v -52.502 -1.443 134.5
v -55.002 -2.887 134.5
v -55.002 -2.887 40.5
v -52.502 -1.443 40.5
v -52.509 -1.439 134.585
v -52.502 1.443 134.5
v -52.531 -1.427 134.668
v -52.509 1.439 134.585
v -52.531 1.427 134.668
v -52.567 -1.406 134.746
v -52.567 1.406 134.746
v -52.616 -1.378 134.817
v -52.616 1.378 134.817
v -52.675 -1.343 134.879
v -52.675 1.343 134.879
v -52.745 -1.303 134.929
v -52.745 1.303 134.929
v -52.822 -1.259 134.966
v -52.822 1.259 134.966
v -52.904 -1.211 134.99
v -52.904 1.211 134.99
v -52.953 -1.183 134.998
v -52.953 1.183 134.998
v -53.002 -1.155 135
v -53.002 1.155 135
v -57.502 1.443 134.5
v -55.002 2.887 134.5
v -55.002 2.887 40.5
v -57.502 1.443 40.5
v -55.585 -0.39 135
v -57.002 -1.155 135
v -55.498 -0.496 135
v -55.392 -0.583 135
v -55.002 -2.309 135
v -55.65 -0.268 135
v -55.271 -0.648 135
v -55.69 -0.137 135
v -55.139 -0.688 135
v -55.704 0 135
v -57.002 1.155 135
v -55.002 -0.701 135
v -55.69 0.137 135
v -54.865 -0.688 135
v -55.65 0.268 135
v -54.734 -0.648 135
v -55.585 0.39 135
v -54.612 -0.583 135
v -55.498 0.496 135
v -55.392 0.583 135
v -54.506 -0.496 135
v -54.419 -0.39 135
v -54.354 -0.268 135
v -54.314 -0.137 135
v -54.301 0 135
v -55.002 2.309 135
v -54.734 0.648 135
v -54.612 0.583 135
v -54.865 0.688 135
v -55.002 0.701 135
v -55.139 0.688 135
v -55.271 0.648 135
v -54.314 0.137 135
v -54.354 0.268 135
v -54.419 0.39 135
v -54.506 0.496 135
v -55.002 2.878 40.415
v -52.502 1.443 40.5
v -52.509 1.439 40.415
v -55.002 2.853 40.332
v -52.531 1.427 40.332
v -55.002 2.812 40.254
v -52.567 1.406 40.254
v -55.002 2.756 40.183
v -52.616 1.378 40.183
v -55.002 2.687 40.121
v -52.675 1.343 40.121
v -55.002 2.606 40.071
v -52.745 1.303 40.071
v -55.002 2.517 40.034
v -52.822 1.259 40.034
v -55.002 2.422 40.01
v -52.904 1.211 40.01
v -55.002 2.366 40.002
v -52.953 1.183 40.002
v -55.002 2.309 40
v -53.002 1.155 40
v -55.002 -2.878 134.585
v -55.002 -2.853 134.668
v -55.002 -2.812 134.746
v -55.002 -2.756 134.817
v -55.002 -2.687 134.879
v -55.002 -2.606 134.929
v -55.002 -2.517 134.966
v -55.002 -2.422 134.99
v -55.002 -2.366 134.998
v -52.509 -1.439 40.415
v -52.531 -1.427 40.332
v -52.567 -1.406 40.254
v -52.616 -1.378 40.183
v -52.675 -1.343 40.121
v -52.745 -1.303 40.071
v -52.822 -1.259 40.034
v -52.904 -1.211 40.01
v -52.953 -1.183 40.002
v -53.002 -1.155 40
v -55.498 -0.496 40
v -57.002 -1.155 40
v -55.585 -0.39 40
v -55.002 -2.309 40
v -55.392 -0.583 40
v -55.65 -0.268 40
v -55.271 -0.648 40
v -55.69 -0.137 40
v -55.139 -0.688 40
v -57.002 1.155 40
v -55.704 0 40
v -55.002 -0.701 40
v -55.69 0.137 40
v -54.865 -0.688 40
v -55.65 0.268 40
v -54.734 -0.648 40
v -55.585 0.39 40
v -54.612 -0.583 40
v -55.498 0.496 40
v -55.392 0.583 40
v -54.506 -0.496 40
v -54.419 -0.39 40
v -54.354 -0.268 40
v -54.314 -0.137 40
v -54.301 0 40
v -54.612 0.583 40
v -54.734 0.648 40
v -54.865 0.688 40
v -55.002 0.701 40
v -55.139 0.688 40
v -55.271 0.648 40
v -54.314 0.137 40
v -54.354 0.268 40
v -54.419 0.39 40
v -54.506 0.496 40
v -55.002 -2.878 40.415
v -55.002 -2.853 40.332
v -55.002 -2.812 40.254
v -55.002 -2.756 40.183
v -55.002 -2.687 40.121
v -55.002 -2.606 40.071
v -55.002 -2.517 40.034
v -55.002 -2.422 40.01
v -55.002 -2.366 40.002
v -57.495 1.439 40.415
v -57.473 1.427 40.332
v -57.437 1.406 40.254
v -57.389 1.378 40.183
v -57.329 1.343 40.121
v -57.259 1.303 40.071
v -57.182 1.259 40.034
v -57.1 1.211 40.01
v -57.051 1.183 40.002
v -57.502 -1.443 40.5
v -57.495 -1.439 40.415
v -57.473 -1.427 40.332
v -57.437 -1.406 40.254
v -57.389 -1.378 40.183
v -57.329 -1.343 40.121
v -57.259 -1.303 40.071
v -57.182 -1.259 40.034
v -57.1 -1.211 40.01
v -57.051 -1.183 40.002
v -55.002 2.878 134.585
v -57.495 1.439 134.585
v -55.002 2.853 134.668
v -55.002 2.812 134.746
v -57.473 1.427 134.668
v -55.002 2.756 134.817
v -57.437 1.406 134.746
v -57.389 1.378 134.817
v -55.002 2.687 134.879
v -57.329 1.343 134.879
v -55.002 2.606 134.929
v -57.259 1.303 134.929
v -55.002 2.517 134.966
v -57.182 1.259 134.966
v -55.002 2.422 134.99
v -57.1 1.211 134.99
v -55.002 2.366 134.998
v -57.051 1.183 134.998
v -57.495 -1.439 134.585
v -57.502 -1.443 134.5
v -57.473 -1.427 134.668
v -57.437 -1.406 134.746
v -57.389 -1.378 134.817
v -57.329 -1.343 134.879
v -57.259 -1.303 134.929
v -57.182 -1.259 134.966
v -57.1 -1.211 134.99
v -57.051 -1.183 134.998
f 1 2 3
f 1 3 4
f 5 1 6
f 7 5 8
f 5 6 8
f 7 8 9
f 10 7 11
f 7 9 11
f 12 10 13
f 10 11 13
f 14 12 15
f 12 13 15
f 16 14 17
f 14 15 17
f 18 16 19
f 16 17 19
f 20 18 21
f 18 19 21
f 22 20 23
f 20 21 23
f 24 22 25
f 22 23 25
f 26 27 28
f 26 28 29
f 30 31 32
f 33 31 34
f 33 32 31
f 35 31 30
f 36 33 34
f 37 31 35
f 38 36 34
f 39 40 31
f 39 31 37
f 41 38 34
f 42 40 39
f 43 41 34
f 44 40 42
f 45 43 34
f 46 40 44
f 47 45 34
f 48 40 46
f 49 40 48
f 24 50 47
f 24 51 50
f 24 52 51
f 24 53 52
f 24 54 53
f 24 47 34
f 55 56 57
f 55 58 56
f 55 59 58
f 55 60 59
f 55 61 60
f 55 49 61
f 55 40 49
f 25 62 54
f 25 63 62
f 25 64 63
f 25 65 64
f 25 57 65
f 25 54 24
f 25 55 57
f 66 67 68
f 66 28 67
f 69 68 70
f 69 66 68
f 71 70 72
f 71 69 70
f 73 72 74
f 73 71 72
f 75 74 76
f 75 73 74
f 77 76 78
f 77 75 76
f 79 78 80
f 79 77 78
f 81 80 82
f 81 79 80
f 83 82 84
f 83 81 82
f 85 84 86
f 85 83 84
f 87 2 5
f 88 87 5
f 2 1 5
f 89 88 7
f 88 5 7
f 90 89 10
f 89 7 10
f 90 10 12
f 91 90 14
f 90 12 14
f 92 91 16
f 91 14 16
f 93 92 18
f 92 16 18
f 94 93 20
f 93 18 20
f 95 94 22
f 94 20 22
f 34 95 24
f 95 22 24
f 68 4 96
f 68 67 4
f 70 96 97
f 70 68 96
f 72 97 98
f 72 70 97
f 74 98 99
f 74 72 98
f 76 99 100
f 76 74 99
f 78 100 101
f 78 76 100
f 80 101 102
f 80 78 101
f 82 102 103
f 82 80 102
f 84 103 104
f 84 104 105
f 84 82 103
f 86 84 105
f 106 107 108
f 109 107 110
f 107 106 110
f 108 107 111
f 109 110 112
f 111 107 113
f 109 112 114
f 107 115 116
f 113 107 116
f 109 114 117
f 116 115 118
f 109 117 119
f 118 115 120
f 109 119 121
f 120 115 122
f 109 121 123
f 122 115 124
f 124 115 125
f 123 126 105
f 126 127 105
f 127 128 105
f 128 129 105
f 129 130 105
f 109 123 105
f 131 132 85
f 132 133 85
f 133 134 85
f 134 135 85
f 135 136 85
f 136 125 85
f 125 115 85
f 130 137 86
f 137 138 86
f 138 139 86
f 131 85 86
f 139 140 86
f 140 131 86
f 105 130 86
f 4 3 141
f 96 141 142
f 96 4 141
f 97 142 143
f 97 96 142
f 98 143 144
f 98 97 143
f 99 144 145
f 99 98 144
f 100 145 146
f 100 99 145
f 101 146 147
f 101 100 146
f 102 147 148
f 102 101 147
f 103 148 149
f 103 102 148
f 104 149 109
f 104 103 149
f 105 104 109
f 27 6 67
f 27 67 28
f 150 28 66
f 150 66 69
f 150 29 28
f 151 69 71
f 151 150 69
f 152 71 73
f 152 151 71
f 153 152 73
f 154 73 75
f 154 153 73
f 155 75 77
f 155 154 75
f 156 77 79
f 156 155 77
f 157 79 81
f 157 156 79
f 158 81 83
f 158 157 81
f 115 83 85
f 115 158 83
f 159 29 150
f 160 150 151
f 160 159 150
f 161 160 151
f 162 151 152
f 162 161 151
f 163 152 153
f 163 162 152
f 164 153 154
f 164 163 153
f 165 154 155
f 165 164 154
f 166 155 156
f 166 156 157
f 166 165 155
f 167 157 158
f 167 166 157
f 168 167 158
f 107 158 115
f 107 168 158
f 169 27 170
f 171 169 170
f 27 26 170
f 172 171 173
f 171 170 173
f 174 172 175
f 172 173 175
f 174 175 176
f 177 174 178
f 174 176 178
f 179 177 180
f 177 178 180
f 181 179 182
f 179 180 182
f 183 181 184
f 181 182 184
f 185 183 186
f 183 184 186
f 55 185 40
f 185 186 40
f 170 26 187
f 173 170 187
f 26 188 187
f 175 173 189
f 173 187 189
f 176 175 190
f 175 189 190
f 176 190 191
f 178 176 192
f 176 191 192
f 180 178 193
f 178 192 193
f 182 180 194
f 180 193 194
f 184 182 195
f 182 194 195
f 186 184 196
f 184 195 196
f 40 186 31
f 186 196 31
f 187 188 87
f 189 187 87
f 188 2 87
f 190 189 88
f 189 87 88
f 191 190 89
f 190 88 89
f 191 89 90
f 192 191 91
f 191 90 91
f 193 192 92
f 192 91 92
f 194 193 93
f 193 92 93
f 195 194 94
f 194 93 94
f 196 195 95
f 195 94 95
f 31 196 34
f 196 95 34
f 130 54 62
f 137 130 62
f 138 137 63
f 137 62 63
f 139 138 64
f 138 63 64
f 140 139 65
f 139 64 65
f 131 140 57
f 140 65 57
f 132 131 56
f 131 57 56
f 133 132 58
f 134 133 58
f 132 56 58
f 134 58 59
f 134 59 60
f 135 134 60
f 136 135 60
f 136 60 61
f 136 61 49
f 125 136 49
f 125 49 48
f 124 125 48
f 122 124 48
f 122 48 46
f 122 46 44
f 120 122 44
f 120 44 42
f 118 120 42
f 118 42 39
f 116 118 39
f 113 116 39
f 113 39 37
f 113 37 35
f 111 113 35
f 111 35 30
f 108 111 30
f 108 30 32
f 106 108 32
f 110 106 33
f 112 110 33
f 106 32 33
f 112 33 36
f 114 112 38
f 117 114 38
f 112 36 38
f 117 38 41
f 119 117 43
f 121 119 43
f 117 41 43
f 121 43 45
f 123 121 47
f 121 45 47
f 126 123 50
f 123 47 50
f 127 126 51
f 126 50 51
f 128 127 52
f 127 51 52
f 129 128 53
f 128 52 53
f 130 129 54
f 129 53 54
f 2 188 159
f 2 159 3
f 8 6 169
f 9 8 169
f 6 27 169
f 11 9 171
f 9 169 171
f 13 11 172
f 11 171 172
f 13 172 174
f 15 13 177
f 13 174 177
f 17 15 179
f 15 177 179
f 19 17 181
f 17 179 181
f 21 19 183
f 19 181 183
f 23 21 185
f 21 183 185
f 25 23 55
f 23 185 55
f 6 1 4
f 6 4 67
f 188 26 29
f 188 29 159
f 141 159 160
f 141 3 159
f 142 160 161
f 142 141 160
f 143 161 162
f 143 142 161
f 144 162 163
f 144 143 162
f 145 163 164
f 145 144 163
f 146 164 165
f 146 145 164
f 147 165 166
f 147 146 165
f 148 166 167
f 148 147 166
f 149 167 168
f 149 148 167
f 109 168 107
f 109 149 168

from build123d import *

# Parameters (mm, degrees)
RESSALTO_EXTRUS_O1_DEPTH = 95
FILETE1_R                = 0.5
ESBO_O2_R                = 0.701481341
CORTE_EXTRUS_O1_DEPTH    = 112.084775939


with BuildPart() as part:
    # Esboço1 → Ressalto-extrusão1 (new body)
    with BuildSketch(Plane.XY.offset(135)):
        Polygon((-55.002122675, 2.886751346), (-57.502122675, 1.443375673), (-57.502122675, -1.443375673), (-55.002122675, -2.886751346), (-52.502122675, -1.443375673), (-52.502122675, 1.443375673), align=None)
    extrude(amount=-RESSALTO_EXTRUS_O1_DEPTH)

    # Filete1
    filete1_edges = [part.edges().sort_by_distance(p)[0] for p in [
        (-57.502122675, 0, 40),
        (-56.252122675, -2.165063509, 40),
        (-53.752122675, -2.165063509, 40),
        (-52.502122675, 0, 40),
        (-53.752122675, 2.165063509, 40),
        (-52.502122675, 0, 135),
        (-53.752122675, -2.165063509, 135),
        (-56.252122675, -2.165063509, 135),
        (-57.502122675, 0, 135),
        (-56.252122675, 2.165063509, 135),
        (-53.752122675, 2.165063509, 135),
        (-56.252122675, 2.165063509, 40),
    ]]
    fillet(filete1_edges, radius=FILETE1_R)

    # Esboço2 → Corte-extrusão1 (cut, through all)
    with BuildSketch(Plane.XY.offset(135)):
        with Locations((-55.002122675, 0)):
            Circle(ESBO_O2_R)
    extrude(amount=-CORTE_EXTRUS_O1_DEPTH, mode=Mode.SUBTRACT)


solid = part.part
